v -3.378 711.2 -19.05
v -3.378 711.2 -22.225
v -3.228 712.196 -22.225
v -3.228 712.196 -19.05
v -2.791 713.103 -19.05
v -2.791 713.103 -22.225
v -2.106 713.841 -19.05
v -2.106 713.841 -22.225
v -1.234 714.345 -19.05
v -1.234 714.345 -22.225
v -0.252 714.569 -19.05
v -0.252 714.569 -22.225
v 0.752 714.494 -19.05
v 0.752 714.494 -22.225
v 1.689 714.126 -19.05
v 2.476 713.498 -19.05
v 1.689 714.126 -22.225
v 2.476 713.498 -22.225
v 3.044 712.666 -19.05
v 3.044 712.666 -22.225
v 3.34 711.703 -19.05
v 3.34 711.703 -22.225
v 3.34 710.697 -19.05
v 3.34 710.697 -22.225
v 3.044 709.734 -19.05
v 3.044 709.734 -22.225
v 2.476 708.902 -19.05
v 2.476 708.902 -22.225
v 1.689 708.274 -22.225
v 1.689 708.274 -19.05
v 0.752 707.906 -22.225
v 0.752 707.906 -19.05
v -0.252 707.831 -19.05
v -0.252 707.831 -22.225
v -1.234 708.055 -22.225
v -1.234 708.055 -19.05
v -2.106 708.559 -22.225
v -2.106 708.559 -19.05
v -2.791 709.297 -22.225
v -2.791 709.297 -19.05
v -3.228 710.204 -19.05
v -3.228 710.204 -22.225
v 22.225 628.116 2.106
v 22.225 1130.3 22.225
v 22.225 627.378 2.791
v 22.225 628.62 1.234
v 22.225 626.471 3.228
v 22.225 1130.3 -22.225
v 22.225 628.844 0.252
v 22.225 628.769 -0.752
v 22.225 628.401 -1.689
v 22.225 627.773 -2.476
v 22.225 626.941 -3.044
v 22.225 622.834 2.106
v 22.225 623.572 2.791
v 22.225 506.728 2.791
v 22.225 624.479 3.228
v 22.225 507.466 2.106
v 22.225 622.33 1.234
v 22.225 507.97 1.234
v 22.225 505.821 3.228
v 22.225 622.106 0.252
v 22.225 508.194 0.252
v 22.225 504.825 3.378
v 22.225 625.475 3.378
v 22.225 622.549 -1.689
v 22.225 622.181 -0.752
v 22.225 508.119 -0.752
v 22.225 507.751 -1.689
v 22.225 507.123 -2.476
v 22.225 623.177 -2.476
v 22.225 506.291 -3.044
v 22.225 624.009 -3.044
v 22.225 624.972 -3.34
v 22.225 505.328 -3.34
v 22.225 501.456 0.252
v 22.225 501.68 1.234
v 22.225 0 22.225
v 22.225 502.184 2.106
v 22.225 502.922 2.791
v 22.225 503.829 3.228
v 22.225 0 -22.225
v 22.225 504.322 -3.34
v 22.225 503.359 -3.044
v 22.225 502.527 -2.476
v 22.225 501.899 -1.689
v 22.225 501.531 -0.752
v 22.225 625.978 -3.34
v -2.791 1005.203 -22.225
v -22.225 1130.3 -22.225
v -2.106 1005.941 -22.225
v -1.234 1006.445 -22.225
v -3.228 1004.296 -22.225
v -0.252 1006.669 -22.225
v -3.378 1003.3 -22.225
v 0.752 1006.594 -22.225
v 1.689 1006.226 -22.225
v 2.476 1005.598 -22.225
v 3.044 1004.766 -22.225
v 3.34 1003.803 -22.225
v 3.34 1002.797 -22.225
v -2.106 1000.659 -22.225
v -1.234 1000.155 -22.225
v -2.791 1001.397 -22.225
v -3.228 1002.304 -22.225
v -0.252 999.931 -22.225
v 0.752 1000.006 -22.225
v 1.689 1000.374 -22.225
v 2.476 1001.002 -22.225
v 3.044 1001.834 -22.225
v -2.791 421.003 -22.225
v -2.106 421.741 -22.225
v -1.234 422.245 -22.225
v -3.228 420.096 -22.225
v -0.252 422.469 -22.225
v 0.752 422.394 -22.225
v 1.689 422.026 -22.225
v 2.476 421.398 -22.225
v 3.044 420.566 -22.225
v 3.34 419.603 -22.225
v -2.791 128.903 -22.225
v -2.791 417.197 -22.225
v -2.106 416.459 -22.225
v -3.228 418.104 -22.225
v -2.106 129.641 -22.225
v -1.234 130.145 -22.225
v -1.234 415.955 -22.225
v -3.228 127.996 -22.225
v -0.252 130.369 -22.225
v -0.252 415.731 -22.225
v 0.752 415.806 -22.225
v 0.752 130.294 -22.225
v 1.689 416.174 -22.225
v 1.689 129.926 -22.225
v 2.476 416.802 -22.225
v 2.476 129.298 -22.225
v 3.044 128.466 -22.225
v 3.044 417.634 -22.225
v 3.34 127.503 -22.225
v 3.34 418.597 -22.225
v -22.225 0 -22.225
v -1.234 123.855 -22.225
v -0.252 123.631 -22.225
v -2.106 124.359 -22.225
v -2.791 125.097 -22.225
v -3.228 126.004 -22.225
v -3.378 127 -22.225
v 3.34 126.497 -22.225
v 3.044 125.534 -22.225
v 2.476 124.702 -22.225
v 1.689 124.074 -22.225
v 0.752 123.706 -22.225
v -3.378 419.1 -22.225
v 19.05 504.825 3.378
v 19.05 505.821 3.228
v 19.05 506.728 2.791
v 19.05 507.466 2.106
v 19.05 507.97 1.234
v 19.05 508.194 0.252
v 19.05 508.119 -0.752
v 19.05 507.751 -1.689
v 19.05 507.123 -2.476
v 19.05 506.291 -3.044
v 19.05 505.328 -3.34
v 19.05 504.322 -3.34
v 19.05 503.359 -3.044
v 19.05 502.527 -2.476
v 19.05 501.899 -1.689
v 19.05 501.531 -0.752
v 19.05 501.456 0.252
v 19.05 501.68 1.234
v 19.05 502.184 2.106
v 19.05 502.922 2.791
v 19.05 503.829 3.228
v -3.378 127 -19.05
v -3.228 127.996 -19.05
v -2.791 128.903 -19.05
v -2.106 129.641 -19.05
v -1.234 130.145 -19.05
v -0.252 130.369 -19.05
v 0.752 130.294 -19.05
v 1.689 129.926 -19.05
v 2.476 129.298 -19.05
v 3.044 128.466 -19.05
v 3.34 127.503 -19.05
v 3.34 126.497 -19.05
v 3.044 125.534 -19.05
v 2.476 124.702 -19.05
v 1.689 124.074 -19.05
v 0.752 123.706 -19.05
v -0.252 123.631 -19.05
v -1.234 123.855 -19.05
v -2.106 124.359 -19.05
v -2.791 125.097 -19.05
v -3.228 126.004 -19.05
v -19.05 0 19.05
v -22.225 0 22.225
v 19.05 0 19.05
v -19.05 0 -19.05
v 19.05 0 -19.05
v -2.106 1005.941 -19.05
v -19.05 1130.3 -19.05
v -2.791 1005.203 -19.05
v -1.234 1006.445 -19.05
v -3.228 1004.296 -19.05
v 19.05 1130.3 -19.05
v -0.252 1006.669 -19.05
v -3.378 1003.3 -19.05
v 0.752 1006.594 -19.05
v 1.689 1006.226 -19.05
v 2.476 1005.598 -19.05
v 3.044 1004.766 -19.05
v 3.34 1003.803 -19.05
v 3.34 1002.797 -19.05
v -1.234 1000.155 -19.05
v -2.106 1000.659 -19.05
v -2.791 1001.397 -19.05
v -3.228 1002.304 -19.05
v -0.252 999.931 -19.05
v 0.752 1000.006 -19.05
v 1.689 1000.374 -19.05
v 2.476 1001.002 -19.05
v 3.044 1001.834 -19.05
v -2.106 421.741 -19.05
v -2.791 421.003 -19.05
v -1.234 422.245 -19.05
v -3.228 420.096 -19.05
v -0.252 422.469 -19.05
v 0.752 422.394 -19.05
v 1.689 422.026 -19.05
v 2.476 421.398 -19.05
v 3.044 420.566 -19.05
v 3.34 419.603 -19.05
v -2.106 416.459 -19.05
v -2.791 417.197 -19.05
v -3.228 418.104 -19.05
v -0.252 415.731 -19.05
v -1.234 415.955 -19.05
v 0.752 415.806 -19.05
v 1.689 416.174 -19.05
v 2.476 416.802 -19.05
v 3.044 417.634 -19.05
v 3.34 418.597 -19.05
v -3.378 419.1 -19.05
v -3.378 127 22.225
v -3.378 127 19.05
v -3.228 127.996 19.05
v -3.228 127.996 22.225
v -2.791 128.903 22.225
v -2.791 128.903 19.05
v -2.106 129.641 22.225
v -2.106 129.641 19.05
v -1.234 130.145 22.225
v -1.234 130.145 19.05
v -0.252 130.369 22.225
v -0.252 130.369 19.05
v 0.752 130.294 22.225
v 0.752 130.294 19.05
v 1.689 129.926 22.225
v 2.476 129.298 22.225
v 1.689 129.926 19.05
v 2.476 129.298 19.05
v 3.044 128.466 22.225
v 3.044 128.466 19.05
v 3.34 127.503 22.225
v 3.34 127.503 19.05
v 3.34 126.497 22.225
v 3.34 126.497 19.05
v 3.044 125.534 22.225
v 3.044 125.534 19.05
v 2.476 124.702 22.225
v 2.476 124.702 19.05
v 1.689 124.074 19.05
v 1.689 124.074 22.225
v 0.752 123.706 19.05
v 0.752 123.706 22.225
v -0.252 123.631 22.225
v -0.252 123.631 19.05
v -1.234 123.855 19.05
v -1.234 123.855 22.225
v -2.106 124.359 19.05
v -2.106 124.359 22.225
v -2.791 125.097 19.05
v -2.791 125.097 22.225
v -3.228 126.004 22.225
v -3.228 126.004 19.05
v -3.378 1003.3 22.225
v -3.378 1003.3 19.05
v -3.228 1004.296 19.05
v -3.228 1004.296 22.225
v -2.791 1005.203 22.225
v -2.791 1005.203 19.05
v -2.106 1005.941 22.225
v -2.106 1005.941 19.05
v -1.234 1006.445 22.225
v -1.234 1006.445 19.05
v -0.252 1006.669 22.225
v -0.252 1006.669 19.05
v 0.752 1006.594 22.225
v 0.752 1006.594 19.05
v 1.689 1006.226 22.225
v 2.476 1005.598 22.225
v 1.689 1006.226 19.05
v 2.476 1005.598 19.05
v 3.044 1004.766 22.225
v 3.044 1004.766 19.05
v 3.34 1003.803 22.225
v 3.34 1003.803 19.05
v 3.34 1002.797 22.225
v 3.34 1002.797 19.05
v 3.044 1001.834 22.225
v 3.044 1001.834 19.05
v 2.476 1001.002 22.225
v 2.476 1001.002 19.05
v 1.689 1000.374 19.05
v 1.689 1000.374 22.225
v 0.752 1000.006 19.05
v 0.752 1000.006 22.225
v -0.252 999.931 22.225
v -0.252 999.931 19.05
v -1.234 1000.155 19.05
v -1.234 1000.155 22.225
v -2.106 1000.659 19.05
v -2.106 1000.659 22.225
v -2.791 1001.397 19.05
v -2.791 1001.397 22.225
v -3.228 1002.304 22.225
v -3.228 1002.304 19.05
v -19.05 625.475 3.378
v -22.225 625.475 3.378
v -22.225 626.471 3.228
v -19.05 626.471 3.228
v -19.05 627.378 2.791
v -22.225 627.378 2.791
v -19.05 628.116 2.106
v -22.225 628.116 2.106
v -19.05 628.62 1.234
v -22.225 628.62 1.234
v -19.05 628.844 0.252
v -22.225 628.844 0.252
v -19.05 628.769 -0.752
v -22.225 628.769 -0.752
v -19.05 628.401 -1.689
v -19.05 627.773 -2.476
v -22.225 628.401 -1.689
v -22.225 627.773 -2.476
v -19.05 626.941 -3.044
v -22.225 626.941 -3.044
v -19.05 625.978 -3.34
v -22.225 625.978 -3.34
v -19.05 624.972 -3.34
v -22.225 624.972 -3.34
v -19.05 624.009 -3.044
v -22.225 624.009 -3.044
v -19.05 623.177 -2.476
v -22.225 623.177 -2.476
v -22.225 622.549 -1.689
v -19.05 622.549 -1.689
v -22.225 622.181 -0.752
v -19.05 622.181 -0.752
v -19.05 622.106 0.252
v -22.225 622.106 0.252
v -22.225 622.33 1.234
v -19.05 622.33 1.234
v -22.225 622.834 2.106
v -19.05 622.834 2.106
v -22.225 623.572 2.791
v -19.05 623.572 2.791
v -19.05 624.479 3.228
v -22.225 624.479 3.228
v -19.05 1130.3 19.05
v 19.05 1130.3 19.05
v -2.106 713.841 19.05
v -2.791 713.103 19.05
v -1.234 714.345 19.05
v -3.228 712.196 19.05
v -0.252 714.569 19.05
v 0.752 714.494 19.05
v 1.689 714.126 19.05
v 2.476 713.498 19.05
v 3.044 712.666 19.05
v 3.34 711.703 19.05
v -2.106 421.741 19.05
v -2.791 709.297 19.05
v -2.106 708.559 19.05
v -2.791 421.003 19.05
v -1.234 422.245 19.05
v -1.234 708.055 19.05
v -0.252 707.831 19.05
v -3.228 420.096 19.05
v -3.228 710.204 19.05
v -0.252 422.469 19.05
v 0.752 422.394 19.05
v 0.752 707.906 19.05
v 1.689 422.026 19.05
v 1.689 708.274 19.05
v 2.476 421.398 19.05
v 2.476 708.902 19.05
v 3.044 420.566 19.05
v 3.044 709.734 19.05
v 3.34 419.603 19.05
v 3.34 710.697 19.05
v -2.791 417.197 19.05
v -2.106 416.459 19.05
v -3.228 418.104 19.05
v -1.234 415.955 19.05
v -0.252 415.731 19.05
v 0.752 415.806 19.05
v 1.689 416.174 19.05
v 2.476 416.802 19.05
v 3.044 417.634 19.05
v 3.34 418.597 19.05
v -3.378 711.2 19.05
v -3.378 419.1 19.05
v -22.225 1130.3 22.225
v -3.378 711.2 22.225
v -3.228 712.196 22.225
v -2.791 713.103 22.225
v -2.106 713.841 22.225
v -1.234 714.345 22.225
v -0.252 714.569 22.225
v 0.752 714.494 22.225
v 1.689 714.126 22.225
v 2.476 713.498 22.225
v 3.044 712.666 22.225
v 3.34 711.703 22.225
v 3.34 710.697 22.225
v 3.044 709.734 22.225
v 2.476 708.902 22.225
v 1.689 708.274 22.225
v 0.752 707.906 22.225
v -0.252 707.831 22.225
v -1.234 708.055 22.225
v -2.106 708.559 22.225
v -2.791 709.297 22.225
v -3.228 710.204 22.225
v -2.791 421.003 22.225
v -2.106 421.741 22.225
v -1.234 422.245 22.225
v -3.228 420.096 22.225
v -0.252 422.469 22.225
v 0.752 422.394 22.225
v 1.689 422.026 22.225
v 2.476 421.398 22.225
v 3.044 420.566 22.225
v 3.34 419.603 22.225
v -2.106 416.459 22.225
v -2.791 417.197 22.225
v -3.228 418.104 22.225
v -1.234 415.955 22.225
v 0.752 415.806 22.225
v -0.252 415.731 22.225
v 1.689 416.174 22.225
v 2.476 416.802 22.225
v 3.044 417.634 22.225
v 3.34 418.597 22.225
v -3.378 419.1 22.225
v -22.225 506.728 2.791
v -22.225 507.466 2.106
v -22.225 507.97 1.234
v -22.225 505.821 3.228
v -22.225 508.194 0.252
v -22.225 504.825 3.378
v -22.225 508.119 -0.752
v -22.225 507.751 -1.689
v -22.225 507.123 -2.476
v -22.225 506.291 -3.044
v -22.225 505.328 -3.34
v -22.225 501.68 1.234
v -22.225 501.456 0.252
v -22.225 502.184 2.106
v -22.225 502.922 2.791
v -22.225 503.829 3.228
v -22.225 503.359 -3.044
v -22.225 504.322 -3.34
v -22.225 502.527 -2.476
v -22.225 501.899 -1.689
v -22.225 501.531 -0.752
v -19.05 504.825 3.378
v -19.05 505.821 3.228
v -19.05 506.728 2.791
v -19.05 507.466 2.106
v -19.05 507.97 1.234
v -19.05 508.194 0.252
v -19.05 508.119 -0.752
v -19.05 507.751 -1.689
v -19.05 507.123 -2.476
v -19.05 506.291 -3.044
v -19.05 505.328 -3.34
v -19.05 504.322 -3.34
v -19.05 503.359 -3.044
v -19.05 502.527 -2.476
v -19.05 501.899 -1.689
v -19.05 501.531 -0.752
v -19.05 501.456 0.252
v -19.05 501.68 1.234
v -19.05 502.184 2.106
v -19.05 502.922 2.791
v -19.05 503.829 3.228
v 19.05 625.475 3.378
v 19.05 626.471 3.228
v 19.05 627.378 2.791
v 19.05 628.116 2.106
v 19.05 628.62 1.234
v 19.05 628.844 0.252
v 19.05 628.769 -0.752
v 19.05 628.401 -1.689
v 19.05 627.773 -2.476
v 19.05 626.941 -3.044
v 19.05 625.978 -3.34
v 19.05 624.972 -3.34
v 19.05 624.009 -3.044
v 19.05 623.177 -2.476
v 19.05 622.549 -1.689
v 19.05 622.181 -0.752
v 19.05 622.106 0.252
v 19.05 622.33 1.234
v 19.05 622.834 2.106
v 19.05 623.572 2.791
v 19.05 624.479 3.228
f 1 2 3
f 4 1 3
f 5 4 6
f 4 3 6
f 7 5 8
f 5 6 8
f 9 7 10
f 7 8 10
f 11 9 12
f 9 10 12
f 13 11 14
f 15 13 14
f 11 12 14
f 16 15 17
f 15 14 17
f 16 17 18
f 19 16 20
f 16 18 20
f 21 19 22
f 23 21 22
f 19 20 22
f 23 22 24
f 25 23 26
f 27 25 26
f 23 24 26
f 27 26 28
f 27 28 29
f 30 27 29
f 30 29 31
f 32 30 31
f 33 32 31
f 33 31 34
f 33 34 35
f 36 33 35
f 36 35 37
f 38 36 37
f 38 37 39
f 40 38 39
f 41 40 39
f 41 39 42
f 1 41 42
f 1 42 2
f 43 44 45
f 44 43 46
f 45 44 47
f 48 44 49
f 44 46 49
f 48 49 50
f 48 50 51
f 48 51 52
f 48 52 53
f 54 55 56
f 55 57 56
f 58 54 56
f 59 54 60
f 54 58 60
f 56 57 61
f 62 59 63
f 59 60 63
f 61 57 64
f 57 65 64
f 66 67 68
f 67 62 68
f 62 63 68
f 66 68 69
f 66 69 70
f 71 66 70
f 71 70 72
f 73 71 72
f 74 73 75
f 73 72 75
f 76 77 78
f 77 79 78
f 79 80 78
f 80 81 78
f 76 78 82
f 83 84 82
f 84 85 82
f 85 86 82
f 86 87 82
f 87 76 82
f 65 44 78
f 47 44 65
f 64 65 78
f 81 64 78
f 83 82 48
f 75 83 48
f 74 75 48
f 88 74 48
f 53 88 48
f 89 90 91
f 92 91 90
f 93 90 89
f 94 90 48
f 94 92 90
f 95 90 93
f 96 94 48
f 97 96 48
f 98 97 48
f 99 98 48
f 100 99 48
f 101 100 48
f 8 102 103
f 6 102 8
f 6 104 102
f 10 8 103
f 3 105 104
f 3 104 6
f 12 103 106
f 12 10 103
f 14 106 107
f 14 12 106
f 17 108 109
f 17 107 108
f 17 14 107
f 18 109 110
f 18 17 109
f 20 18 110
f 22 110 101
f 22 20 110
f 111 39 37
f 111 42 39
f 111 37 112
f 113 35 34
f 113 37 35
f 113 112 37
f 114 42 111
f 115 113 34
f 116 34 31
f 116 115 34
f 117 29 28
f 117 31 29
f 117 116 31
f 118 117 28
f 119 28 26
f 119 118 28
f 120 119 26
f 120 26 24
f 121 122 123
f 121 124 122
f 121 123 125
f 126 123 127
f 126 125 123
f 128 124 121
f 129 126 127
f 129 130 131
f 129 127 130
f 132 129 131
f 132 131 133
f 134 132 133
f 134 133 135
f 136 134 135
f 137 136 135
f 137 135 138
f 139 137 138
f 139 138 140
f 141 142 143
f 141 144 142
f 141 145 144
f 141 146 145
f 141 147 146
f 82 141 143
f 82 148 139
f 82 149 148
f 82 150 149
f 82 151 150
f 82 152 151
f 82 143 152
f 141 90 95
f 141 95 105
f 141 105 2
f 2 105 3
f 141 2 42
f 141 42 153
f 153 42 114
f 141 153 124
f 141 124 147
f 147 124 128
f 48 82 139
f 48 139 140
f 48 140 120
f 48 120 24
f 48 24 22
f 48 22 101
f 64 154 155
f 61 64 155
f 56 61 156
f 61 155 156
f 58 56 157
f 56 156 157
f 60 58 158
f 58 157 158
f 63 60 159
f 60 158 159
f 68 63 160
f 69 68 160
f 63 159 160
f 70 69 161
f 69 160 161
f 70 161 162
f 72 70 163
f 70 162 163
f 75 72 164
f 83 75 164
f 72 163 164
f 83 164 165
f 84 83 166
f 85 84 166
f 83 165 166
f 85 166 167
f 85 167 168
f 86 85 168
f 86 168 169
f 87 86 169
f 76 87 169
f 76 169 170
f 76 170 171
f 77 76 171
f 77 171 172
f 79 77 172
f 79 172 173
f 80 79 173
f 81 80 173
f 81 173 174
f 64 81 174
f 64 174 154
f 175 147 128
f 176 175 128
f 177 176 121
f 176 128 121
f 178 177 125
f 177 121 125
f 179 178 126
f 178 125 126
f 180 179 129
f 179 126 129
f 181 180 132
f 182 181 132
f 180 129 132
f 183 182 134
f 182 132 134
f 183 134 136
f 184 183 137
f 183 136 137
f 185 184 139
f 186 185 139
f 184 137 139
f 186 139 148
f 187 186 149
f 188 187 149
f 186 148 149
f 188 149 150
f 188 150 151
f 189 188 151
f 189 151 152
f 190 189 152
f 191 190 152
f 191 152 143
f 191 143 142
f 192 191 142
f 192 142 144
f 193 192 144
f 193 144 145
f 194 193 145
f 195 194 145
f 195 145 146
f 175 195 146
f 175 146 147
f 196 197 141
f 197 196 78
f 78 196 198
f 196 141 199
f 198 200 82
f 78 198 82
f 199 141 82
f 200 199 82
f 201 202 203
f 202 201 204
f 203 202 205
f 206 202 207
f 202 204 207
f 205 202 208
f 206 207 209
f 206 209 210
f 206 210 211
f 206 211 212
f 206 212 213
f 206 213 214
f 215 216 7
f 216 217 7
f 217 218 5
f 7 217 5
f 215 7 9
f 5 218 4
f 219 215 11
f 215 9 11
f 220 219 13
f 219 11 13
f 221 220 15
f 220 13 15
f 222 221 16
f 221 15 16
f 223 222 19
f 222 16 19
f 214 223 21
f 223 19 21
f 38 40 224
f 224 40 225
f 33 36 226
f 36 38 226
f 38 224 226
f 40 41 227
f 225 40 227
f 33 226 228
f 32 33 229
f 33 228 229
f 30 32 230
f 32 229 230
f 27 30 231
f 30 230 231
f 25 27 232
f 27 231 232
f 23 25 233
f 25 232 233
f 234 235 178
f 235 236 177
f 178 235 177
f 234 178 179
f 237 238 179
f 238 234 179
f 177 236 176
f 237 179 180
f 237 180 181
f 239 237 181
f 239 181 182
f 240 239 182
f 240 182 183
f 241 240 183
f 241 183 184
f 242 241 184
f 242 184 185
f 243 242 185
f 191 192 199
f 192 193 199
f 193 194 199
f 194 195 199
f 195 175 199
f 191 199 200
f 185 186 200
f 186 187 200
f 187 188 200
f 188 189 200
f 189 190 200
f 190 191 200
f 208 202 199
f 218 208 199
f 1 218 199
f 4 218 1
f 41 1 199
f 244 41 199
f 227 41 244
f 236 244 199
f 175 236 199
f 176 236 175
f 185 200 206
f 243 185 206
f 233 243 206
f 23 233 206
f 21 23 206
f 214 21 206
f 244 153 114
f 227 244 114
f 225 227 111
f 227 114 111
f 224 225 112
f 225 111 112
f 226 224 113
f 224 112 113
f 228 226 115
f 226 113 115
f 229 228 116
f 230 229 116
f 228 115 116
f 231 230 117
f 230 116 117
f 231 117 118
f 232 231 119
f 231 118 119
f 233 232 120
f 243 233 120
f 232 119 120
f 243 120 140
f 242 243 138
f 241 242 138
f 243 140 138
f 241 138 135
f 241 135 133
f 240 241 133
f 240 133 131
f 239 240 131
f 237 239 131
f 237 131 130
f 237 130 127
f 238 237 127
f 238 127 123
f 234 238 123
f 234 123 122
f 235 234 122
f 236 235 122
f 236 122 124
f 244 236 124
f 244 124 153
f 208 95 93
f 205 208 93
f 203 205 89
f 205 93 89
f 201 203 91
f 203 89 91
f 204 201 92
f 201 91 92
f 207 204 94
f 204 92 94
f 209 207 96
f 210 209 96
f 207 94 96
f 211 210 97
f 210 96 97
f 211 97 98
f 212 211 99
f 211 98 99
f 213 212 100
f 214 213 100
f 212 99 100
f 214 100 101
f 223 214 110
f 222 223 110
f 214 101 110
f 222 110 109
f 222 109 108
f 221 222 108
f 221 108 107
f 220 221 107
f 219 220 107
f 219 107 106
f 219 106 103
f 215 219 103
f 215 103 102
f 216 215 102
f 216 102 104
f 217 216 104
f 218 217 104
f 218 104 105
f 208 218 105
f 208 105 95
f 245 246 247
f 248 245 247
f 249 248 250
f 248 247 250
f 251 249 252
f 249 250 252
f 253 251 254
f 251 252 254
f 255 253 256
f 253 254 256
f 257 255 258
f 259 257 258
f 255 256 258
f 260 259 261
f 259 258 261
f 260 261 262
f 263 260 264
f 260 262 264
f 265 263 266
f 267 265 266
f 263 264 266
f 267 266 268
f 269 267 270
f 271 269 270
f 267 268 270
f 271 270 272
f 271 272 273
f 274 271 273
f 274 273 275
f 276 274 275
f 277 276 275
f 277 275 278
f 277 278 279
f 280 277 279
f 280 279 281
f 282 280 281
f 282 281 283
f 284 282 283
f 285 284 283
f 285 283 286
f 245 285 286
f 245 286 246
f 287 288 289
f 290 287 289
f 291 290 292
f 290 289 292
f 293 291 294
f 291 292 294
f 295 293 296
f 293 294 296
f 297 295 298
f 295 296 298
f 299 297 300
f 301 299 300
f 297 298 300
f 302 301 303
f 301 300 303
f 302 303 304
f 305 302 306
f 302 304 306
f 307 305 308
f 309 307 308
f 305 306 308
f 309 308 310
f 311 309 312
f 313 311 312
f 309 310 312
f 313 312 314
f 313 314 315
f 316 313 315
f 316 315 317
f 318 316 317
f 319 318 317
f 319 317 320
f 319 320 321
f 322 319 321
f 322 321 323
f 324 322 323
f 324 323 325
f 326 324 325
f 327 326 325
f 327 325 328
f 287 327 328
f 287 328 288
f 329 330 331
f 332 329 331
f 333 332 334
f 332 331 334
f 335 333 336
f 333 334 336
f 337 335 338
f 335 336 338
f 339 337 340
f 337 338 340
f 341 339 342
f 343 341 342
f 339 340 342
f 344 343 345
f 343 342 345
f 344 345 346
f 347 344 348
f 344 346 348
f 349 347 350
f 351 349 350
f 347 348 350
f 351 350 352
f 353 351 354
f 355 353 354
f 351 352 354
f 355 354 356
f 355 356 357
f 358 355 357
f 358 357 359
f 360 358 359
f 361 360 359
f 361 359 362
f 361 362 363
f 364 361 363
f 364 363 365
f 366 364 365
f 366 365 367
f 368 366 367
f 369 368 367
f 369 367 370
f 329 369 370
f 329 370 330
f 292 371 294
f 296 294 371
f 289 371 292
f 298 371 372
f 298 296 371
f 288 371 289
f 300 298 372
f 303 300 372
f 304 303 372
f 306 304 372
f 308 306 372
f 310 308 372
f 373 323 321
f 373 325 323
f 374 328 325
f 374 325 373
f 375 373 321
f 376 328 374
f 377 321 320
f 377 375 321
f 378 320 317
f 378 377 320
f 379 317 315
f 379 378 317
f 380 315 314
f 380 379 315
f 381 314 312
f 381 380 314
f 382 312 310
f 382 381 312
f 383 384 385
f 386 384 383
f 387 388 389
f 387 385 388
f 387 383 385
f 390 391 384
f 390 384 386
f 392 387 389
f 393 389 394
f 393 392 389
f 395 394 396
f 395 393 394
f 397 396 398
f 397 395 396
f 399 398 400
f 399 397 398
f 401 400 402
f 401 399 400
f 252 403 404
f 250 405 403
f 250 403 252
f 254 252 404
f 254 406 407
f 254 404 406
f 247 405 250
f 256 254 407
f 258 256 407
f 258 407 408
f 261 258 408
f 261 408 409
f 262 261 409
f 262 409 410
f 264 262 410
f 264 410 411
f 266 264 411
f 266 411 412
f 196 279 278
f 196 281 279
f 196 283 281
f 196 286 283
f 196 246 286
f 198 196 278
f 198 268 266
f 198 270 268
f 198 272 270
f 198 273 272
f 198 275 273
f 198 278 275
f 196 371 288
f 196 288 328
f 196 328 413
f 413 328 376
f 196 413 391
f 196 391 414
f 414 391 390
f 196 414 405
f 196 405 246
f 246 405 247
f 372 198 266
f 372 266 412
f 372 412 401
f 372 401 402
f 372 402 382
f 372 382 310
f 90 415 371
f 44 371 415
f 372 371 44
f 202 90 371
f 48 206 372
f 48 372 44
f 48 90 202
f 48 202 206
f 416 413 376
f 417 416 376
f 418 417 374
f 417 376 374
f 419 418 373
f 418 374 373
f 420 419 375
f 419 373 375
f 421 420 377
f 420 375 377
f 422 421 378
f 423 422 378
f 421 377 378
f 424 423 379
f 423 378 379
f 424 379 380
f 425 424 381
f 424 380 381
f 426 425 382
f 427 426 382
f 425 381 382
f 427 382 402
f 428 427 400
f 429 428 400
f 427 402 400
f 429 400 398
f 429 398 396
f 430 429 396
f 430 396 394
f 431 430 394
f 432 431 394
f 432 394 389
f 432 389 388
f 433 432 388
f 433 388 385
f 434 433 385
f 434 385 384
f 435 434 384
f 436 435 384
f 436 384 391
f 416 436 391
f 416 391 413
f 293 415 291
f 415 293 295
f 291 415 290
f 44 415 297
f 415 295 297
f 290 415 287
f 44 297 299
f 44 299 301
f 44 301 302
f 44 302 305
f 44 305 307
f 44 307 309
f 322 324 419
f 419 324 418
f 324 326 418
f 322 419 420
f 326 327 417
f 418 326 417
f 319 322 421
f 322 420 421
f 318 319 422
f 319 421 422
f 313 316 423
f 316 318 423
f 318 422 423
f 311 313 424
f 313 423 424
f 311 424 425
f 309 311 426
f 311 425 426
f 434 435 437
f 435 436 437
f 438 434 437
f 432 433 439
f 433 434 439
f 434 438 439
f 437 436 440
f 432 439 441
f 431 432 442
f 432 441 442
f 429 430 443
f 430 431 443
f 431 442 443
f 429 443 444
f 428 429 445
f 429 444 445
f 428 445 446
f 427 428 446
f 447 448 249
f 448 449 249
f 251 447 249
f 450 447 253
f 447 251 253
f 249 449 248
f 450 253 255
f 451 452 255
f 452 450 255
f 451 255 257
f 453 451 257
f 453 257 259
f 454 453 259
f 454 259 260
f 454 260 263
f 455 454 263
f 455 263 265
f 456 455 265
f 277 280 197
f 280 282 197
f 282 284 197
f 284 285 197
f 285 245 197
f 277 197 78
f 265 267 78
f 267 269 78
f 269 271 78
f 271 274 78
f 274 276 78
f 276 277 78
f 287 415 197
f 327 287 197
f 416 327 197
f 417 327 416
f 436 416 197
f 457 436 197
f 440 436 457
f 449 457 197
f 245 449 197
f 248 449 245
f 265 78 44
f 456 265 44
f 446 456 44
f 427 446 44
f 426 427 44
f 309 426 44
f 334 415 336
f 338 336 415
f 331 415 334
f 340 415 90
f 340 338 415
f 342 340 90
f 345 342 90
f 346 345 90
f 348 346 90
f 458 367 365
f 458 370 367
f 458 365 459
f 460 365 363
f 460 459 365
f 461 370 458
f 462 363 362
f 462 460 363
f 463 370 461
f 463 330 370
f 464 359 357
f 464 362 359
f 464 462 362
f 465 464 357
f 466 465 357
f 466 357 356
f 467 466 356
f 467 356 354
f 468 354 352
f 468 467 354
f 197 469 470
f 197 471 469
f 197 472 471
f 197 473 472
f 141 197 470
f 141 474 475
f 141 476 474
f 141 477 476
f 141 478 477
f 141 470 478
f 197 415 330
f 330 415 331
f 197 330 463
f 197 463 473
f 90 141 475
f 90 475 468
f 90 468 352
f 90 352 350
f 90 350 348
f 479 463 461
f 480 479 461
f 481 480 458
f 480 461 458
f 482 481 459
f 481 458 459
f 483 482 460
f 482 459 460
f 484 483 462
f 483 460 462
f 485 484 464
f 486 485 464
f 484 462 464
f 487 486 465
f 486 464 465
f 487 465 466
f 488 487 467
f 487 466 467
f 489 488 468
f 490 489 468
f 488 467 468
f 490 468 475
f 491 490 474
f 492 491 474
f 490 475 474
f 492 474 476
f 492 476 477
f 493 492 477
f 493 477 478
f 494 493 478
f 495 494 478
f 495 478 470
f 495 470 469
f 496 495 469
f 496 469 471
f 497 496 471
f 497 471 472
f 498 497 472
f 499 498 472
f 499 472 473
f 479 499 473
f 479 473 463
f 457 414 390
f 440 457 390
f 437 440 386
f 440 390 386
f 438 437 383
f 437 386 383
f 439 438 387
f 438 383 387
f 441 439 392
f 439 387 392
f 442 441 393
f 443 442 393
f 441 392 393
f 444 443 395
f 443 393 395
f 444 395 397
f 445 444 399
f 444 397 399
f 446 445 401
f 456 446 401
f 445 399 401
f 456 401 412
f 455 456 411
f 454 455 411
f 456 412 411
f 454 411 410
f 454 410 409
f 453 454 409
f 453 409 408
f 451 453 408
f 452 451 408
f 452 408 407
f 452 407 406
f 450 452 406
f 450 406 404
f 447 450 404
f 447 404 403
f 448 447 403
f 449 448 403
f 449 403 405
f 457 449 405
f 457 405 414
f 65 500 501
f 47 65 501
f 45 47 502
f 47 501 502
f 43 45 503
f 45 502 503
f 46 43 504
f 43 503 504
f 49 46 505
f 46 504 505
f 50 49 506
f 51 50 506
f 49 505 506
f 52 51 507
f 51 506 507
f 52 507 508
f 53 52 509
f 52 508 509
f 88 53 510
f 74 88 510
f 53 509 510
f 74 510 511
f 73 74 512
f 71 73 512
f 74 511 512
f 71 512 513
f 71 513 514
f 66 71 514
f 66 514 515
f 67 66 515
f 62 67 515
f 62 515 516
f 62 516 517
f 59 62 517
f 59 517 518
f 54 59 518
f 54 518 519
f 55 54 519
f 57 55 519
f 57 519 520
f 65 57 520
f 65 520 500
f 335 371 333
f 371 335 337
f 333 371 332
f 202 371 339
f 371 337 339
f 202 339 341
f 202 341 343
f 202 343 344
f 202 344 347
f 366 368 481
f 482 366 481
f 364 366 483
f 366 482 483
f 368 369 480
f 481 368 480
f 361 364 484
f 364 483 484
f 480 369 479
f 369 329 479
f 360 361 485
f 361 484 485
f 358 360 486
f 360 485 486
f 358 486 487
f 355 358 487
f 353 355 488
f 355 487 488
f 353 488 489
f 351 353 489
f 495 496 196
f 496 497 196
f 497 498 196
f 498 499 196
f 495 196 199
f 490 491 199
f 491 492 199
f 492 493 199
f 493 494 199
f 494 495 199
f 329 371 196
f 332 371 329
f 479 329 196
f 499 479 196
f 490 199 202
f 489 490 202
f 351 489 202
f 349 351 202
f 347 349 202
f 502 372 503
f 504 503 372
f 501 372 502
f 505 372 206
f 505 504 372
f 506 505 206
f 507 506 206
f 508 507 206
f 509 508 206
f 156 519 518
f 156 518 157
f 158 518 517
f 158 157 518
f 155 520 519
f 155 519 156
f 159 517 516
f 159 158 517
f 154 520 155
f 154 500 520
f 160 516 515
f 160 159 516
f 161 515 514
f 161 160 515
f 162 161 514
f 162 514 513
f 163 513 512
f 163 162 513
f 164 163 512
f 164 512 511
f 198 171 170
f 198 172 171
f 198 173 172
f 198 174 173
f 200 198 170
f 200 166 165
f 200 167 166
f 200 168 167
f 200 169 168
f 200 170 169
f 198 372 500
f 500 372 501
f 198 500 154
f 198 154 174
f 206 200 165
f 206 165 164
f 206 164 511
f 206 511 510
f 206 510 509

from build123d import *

# Parameters (mm, degrees)
SKETCH1_W               = 44.45
SKETCH1_H               = 44.45
SKETCH1_W_2             = 38.1
SKETCH1_H_2             = 38.1
BOSS_EXTRUDE1_DEPTH     = 1130.3
F_1_4_CLEARANCE_HOLE1_D = 6.7564
F_1_4_CLEARANCE_HOLE2_D = 6.7564


with BuildPart() as part:
    # Sketch1 → Boss-Extrude1 (new body)
    with BuildSketch(Plane(origin=(0, 0, 0), x_dir=(1, 0, 0), z_dir=(0, 1, 0))):
        Rectangle(SKETCH1_W, SKETCH1_H)
        Rectangle(SKETCH1_W_2, SKETCH1_H_2, mode=Mode.SUBTRACT)
    extrude(amount=BOSS_EXTRUDE1_DEPTH)

    # 1/4 Clearance Hole1 (through all)
    with Locations(Plane.XY.offset(22.225)):
        with Locations((0, 127), (0, 1003.3), (0, 711.2), (0, 419.1)):
            Hole(F_1_4_CLEARANCE_HOLE1_D / 2)

    # 1/4 Clearance Hole2 (through all)
    with Locations(Plane(origin=(22.225, 0, 0), x_dir=(0, 0, -1), z_dir=(1, 0, 0))):
        with Locations((0, 625.475), (0, 504.825)):
            Hole(F_1_4_CLEARANCE_HOLE2_D / 2)


solid = part.part
